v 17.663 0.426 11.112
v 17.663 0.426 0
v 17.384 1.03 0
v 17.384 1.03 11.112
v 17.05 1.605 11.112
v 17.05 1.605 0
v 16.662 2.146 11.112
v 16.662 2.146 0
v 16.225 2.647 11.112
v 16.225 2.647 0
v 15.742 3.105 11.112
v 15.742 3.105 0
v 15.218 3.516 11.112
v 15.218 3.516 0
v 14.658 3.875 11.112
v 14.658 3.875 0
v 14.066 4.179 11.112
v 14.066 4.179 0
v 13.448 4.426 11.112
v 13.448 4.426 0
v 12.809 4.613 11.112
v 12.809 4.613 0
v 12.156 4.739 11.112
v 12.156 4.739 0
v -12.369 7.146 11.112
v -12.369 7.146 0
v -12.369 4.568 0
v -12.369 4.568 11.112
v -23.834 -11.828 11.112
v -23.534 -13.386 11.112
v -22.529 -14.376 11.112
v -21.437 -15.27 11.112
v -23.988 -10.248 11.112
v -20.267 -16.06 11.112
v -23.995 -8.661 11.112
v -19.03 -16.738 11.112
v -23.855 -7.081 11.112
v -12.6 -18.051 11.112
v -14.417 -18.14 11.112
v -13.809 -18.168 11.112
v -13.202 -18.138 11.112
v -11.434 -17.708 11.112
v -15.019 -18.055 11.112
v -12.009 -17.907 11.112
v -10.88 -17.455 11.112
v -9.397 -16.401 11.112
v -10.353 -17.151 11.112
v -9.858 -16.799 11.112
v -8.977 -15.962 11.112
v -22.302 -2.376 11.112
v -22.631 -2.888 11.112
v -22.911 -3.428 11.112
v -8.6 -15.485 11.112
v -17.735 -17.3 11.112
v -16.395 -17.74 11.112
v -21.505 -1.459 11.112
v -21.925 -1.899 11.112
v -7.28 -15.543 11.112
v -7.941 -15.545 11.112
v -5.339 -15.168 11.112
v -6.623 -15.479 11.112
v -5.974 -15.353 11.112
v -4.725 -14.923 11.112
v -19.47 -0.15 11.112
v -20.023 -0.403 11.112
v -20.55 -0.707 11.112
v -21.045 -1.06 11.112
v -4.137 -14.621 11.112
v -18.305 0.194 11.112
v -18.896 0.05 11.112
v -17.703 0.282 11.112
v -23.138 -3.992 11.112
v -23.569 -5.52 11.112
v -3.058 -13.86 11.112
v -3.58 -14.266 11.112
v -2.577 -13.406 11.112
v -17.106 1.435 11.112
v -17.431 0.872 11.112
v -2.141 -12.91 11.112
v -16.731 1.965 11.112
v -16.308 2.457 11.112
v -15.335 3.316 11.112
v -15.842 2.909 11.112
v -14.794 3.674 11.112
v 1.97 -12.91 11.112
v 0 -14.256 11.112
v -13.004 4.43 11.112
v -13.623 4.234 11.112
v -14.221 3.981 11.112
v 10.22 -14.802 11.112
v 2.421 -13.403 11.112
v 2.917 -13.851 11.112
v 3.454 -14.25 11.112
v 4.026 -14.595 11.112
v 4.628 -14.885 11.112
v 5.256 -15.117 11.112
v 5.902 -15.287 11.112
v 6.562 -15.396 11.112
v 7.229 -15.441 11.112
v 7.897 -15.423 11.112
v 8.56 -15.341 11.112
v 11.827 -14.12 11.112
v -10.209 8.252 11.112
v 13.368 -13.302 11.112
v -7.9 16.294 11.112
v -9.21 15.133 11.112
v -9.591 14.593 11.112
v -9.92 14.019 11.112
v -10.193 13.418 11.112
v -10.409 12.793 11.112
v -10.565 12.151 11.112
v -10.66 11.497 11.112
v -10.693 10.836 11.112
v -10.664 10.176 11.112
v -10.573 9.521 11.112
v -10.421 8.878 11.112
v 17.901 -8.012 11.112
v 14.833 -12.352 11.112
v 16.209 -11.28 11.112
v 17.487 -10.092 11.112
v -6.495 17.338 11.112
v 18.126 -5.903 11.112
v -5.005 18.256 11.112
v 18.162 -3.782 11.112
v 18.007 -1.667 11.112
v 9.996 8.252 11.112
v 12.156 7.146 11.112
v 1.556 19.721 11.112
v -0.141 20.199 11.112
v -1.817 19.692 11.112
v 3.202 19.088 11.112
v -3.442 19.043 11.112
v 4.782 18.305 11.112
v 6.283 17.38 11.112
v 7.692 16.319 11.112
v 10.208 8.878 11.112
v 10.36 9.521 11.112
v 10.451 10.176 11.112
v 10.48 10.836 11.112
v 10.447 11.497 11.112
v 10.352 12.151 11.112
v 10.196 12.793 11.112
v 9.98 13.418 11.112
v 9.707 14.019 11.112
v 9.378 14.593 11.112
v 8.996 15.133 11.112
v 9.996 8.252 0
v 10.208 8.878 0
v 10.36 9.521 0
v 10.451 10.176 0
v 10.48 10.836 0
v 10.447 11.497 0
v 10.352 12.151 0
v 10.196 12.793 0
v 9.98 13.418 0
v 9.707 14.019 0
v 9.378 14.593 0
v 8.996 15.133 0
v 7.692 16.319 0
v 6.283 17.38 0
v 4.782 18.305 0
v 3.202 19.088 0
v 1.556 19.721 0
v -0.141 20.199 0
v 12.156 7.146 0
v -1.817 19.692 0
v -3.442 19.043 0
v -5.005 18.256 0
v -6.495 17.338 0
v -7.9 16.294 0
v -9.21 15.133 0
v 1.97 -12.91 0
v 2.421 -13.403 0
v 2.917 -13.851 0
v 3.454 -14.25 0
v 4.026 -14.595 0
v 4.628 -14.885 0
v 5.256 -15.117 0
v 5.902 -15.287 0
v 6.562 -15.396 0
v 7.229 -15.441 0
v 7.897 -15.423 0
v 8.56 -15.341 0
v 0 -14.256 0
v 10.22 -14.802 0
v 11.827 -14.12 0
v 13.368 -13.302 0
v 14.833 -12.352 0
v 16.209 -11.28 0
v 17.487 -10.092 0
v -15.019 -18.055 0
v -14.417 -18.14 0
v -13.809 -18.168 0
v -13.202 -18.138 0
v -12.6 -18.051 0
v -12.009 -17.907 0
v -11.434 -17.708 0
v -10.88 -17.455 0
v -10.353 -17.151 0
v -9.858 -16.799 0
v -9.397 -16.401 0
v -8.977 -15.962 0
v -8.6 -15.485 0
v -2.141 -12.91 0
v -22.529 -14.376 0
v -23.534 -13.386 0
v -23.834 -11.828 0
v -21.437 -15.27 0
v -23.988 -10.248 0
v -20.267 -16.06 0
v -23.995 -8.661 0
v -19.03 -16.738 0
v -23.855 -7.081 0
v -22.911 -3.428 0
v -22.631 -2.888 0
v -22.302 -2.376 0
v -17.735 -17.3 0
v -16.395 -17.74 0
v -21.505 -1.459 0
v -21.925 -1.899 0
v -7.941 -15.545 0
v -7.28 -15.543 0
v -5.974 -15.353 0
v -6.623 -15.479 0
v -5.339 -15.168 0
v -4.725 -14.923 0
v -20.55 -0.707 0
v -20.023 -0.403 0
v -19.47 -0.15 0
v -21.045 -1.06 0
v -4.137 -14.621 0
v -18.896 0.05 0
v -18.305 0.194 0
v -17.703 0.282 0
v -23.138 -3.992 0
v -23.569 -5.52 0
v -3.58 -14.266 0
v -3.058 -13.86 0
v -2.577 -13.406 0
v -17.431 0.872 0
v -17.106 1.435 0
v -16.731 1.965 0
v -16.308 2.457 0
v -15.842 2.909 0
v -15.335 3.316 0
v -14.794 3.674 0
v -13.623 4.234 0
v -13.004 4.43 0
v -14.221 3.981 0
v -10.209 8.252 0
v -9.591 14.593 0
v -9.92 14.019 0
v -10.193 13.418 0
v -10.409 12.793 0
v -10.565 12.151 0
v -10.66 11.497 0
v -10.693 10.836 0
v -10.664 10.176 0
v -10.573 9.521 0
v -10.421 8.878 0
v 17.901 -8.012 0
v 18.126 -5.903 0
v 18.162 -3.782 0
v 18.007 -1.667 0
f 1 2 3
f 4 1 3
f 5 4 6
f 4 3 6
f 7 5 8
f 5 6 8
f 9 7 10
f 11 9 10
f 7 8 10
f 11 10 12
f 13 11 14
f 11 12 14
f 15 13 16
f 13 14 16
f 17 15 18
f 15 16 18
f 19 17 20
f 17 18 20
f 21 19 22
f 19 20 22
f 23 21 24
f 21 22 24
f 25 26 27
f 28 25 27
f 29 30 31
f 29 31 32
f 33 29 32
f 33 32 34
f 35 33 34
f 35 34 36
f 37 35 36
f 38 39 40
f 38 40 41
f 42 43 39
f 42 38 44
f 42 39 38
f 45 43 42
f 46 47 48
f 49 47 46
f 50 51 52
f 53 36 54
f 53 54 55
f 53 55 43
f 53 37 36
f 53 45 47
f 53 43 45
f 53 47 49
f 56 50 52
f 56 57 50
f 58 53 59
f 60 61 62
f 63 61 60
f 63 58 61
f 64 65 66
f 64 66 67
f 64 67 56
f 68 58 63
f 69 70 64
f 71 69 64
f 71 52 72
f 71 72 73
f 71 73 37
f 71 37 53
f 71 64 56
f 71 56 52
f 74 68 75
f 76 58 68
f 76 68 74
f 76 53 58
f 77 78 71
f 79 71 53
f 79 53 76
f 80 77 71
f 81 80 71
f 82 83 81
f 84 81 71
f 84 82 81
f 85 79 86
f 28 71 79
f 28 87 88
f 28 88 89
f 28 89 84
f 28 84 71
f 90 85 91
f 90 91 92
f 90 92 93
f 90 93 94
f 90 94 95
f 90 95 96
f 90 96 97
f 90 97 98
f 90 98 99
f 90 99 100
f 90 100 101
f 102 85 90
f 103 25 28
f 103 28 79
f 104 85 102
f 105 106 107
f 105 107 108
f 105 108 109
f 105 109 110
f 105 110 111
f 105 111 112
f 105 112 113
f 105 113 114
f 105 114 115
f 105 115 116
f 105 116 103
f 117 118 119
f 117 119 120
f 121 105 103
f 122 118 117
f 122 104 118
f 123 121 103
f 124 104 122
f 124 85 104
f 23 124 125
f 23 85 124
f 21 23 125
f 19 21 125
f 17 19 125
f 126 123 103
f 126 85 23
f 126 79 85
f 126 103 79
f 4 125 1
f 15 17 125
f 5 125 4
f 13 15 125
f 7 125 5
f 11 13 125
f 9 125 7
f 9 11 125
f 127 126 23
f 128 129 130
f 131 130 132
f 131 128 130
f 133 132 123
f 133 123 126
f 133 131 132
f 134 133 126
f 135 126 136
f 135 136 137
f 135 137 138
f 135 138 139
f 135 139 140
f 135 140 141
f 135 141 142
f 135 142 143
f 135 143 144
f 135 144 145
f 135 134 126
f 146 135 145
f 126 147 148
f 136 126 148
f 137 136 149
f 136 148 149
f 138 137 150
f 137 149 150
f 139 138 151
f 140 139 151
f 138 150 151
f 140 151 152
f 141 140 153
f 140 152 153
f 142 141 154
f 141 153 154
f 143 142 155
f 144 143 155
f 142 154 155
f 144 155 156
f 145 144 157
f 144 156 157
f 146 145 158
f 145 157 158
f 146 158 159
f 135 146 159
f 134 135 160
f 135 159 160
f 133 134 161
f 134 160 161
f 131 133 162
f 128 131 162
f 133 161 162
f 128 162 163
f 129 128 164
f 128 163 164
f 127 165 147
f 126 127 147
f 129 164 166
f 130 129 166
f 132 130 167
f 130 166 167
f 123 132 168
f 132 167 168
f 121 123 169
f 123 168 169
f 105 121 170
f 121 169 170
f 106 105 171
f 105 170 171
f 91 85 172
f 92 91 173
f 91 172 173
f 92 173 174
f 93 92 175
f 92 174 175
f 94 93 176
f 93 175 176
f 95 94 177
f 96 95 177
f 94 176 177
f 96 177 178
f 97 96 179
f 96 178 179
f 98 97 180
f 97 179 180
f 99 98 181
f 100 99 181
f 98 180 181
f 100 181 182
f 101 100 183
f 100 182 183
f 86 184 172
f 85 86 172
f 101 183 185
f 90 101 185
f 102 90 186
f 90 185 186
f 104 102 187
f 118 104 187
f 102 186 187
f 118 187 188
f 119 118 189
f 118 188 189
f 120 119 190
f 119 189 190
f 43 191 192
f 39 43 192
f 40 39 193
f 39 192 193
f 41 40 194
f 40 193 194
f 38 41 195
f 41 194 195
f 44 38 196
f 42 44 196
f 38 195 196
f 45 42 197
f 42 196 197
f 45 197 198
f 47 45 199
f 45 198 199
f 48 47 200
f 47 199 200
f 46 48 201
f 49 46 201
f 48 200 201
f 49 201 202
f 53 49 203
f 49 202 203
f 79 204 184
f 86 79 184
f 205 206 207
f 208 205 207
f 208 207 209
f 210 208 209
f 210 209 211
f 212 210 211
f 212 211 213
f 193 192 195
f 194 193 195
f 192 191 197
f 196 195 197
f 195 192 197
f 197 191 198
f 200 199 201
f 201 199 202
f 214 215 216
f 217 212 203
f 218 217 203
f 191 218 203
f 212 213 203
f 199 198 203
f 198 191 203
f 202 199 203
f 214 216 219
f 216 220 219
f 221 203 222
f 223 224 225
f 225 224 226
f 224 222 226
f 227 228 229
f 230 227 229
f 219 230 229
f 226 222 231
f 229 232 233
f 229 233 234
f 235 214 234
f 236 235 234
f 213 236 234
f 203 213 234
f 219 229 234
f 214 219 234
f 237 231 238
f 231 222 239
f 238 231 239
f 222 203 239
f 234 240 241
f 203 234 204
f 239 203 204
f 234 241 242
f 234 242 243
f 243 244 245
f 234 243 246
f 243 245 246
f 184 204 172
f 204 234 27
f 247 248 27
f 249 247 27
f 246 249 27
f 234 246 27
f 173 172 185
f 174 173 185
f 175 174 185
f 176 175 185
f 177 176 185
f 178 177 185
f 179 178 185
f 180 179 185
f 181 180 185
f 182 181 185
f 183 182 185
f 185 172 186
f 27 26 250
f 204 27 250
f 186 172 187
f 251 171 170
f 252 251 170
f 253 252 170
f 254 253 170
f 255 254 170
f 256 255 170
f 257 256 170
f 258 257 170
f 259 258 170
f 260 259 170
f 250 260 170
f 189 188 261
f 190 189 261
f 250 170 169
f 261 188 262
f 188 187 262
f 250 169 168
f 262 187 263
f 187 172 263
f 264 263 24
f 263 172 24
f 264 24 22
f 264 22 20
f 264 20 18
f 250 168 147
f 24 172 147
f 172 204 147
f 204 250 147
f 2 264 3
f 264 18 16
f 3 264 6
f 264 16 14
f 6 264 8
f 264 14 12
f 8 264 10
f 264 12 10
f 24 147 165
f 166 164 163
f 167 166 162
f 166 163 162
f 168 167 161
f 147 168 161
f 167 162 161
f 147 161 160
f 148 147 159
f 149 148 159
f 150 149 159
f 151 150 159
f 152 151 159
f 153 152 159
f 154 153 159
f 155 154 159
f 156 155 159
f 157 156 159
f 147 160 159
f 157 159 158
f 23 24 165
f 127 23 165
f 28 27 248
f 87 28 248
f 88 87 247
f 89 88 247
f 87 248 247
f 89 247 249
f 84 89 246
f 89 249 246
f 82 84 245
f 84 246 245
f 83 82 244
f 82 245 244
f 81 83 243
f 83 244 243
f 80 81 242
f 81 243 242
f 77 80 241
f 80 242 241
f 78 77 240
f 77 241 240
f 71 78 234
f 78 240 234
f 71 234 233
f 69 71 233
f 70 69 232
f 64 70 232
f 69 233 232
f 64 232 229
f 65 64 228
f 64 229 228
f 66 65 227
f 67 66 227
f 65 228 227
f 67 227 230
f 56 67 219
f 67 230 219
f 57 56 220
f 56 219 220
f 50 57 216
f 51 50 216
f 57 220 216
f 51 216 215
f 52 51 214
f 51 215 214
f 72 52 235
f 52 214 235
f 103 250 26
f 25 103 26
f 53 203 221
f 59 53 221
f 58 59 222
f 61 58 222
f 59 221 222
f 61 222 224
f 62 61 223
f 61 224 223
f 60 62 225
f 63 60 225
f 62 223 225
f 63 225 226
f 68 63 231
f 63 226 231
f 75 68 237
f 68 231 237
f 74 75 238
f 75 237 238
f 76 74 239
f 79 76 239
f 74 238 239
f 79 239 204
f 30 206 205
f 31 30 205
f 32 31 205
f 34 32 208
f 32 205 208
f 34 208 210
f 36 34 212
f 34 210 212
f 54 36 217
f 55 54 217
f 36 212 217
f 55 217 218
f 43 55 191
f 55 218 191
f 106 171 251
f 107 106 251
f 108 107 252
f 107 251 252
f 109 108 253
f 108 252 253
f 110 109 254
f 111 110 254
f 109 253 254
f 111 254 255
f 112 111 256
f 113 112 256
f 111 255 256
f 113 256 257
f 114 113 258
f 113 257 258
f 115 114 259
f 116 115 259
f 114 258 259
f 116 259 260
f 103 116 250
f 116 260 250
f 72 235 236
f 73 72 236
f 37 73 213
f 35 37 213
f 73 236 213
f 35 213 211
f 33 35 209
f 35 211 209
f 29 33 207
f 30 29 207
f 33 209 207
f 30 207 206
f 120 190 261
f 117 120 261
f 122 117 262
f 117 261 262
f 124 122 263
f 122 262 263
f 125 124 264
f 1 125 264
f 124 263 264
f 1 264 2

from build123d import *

# Parameters (mm, degrees)
F1_DEPTH = 11.1125


# Not quite as in the source:
# - a length typed as a fraction of an inch, garbled in the dataset ("3 / 203.2 mm" for 3/8 in), is restored


with BuildPart() as f1:
    # F0 (on Top) → F1 (new body)
    with BuildSketch(Plane.XY):
        with BuildLine():
            ThreePointArc((-0.1411418198, 20.1985444874), (-5.0054503986, 18.2564119782), (-9.2097157612, 15.1327075437))
            ThreePointArc((-9.2097157612, 15.1327075437), (-10.6205392688, 11.8246856933), (-10.2093555033, 8.2519613206))
            Line((-10.2093555033, 8.2519613206), (-12.369341217, 7.1464567445))
            Line((-12.369341217, 7.1464567445), (-12.369341217, 4.6386048198))
            Line((-12.369341217, 4.6386048198), (-12.369341217, 4.5682978211))
            ThreePointArc((-12.369341217, 4.5682978211), (-15.5930977879, 3.1185654947), (-17.7027139134, 0.2823972963))
            ThreePointArc((-17.7027139134, 0.2823972963), (-21.0452825194, -1.0603738309), (-23.1384971151, -3.9919692741))
            ThreePointArc((-23.1384971151, -3.9919692741), (-23.9954710425, -8.6613028545), (-23.5336683691, -13.3861117065))
            ThreePointArc((-23.5336683691, -13.3861117065), (-19.6562098094, -16.4130421994), (-15.0192606046, -18.054899429))
            ThreePointArc((-15.0192606046, -18.054899429), (-11.4338171794, -17.7079201351), (-8.5996589687, -15.484556372))
            ThreePointArc((-8.5996589687, -15.484556372), (-5.0294162563, -15.0523544446), (-2.1409380715, -12.9098966718))
            Line((-2.1409380715, -12.9098966718), (0, -14.2561570176))
            Line((0, -14.2561570176), (1.9696742658, -12.9098966718))
            ThreePointArc((1.9696742658, -12.9098966718), (4.9392756736, -15.0084468105), (8.560301624, -15.3410370587))
            ThreePointArc((8.560301624, -15.3410370587), (13.367982191, -13.3015402533), (17.4874793738, -10.0916987285))
            ThreePointArc((17.4874793738, -10.0916987285), (18.16772005, -4.8427956267), (17.6633565687, 0.4259166096))
            ThreePointArc((17.6633565687, 0.4259166096), (15.4847616458, 3.3168082822), (12.1560195839, 4.739132713))
            Line((12.1560195839, 4.739132713), (12.1560195839, 7.1464567445))
            Line((12.1560195839, 7.1464567445), (9.9960338703, 8.2519613206))
            ThreePointArc((9.9960338703, 8.2519613206), (10.4072176357, 11.8246856933), (8.9963941282, 15.1327075437))
            ThreePointArc((8.9963941282, 15.1327075437), (4.7823081966, 18.3053860292), (-0.1411418198, 20.1985444874))
        make_face()
    extrude(amount=F1_DEPTH)


solid = f1.part
